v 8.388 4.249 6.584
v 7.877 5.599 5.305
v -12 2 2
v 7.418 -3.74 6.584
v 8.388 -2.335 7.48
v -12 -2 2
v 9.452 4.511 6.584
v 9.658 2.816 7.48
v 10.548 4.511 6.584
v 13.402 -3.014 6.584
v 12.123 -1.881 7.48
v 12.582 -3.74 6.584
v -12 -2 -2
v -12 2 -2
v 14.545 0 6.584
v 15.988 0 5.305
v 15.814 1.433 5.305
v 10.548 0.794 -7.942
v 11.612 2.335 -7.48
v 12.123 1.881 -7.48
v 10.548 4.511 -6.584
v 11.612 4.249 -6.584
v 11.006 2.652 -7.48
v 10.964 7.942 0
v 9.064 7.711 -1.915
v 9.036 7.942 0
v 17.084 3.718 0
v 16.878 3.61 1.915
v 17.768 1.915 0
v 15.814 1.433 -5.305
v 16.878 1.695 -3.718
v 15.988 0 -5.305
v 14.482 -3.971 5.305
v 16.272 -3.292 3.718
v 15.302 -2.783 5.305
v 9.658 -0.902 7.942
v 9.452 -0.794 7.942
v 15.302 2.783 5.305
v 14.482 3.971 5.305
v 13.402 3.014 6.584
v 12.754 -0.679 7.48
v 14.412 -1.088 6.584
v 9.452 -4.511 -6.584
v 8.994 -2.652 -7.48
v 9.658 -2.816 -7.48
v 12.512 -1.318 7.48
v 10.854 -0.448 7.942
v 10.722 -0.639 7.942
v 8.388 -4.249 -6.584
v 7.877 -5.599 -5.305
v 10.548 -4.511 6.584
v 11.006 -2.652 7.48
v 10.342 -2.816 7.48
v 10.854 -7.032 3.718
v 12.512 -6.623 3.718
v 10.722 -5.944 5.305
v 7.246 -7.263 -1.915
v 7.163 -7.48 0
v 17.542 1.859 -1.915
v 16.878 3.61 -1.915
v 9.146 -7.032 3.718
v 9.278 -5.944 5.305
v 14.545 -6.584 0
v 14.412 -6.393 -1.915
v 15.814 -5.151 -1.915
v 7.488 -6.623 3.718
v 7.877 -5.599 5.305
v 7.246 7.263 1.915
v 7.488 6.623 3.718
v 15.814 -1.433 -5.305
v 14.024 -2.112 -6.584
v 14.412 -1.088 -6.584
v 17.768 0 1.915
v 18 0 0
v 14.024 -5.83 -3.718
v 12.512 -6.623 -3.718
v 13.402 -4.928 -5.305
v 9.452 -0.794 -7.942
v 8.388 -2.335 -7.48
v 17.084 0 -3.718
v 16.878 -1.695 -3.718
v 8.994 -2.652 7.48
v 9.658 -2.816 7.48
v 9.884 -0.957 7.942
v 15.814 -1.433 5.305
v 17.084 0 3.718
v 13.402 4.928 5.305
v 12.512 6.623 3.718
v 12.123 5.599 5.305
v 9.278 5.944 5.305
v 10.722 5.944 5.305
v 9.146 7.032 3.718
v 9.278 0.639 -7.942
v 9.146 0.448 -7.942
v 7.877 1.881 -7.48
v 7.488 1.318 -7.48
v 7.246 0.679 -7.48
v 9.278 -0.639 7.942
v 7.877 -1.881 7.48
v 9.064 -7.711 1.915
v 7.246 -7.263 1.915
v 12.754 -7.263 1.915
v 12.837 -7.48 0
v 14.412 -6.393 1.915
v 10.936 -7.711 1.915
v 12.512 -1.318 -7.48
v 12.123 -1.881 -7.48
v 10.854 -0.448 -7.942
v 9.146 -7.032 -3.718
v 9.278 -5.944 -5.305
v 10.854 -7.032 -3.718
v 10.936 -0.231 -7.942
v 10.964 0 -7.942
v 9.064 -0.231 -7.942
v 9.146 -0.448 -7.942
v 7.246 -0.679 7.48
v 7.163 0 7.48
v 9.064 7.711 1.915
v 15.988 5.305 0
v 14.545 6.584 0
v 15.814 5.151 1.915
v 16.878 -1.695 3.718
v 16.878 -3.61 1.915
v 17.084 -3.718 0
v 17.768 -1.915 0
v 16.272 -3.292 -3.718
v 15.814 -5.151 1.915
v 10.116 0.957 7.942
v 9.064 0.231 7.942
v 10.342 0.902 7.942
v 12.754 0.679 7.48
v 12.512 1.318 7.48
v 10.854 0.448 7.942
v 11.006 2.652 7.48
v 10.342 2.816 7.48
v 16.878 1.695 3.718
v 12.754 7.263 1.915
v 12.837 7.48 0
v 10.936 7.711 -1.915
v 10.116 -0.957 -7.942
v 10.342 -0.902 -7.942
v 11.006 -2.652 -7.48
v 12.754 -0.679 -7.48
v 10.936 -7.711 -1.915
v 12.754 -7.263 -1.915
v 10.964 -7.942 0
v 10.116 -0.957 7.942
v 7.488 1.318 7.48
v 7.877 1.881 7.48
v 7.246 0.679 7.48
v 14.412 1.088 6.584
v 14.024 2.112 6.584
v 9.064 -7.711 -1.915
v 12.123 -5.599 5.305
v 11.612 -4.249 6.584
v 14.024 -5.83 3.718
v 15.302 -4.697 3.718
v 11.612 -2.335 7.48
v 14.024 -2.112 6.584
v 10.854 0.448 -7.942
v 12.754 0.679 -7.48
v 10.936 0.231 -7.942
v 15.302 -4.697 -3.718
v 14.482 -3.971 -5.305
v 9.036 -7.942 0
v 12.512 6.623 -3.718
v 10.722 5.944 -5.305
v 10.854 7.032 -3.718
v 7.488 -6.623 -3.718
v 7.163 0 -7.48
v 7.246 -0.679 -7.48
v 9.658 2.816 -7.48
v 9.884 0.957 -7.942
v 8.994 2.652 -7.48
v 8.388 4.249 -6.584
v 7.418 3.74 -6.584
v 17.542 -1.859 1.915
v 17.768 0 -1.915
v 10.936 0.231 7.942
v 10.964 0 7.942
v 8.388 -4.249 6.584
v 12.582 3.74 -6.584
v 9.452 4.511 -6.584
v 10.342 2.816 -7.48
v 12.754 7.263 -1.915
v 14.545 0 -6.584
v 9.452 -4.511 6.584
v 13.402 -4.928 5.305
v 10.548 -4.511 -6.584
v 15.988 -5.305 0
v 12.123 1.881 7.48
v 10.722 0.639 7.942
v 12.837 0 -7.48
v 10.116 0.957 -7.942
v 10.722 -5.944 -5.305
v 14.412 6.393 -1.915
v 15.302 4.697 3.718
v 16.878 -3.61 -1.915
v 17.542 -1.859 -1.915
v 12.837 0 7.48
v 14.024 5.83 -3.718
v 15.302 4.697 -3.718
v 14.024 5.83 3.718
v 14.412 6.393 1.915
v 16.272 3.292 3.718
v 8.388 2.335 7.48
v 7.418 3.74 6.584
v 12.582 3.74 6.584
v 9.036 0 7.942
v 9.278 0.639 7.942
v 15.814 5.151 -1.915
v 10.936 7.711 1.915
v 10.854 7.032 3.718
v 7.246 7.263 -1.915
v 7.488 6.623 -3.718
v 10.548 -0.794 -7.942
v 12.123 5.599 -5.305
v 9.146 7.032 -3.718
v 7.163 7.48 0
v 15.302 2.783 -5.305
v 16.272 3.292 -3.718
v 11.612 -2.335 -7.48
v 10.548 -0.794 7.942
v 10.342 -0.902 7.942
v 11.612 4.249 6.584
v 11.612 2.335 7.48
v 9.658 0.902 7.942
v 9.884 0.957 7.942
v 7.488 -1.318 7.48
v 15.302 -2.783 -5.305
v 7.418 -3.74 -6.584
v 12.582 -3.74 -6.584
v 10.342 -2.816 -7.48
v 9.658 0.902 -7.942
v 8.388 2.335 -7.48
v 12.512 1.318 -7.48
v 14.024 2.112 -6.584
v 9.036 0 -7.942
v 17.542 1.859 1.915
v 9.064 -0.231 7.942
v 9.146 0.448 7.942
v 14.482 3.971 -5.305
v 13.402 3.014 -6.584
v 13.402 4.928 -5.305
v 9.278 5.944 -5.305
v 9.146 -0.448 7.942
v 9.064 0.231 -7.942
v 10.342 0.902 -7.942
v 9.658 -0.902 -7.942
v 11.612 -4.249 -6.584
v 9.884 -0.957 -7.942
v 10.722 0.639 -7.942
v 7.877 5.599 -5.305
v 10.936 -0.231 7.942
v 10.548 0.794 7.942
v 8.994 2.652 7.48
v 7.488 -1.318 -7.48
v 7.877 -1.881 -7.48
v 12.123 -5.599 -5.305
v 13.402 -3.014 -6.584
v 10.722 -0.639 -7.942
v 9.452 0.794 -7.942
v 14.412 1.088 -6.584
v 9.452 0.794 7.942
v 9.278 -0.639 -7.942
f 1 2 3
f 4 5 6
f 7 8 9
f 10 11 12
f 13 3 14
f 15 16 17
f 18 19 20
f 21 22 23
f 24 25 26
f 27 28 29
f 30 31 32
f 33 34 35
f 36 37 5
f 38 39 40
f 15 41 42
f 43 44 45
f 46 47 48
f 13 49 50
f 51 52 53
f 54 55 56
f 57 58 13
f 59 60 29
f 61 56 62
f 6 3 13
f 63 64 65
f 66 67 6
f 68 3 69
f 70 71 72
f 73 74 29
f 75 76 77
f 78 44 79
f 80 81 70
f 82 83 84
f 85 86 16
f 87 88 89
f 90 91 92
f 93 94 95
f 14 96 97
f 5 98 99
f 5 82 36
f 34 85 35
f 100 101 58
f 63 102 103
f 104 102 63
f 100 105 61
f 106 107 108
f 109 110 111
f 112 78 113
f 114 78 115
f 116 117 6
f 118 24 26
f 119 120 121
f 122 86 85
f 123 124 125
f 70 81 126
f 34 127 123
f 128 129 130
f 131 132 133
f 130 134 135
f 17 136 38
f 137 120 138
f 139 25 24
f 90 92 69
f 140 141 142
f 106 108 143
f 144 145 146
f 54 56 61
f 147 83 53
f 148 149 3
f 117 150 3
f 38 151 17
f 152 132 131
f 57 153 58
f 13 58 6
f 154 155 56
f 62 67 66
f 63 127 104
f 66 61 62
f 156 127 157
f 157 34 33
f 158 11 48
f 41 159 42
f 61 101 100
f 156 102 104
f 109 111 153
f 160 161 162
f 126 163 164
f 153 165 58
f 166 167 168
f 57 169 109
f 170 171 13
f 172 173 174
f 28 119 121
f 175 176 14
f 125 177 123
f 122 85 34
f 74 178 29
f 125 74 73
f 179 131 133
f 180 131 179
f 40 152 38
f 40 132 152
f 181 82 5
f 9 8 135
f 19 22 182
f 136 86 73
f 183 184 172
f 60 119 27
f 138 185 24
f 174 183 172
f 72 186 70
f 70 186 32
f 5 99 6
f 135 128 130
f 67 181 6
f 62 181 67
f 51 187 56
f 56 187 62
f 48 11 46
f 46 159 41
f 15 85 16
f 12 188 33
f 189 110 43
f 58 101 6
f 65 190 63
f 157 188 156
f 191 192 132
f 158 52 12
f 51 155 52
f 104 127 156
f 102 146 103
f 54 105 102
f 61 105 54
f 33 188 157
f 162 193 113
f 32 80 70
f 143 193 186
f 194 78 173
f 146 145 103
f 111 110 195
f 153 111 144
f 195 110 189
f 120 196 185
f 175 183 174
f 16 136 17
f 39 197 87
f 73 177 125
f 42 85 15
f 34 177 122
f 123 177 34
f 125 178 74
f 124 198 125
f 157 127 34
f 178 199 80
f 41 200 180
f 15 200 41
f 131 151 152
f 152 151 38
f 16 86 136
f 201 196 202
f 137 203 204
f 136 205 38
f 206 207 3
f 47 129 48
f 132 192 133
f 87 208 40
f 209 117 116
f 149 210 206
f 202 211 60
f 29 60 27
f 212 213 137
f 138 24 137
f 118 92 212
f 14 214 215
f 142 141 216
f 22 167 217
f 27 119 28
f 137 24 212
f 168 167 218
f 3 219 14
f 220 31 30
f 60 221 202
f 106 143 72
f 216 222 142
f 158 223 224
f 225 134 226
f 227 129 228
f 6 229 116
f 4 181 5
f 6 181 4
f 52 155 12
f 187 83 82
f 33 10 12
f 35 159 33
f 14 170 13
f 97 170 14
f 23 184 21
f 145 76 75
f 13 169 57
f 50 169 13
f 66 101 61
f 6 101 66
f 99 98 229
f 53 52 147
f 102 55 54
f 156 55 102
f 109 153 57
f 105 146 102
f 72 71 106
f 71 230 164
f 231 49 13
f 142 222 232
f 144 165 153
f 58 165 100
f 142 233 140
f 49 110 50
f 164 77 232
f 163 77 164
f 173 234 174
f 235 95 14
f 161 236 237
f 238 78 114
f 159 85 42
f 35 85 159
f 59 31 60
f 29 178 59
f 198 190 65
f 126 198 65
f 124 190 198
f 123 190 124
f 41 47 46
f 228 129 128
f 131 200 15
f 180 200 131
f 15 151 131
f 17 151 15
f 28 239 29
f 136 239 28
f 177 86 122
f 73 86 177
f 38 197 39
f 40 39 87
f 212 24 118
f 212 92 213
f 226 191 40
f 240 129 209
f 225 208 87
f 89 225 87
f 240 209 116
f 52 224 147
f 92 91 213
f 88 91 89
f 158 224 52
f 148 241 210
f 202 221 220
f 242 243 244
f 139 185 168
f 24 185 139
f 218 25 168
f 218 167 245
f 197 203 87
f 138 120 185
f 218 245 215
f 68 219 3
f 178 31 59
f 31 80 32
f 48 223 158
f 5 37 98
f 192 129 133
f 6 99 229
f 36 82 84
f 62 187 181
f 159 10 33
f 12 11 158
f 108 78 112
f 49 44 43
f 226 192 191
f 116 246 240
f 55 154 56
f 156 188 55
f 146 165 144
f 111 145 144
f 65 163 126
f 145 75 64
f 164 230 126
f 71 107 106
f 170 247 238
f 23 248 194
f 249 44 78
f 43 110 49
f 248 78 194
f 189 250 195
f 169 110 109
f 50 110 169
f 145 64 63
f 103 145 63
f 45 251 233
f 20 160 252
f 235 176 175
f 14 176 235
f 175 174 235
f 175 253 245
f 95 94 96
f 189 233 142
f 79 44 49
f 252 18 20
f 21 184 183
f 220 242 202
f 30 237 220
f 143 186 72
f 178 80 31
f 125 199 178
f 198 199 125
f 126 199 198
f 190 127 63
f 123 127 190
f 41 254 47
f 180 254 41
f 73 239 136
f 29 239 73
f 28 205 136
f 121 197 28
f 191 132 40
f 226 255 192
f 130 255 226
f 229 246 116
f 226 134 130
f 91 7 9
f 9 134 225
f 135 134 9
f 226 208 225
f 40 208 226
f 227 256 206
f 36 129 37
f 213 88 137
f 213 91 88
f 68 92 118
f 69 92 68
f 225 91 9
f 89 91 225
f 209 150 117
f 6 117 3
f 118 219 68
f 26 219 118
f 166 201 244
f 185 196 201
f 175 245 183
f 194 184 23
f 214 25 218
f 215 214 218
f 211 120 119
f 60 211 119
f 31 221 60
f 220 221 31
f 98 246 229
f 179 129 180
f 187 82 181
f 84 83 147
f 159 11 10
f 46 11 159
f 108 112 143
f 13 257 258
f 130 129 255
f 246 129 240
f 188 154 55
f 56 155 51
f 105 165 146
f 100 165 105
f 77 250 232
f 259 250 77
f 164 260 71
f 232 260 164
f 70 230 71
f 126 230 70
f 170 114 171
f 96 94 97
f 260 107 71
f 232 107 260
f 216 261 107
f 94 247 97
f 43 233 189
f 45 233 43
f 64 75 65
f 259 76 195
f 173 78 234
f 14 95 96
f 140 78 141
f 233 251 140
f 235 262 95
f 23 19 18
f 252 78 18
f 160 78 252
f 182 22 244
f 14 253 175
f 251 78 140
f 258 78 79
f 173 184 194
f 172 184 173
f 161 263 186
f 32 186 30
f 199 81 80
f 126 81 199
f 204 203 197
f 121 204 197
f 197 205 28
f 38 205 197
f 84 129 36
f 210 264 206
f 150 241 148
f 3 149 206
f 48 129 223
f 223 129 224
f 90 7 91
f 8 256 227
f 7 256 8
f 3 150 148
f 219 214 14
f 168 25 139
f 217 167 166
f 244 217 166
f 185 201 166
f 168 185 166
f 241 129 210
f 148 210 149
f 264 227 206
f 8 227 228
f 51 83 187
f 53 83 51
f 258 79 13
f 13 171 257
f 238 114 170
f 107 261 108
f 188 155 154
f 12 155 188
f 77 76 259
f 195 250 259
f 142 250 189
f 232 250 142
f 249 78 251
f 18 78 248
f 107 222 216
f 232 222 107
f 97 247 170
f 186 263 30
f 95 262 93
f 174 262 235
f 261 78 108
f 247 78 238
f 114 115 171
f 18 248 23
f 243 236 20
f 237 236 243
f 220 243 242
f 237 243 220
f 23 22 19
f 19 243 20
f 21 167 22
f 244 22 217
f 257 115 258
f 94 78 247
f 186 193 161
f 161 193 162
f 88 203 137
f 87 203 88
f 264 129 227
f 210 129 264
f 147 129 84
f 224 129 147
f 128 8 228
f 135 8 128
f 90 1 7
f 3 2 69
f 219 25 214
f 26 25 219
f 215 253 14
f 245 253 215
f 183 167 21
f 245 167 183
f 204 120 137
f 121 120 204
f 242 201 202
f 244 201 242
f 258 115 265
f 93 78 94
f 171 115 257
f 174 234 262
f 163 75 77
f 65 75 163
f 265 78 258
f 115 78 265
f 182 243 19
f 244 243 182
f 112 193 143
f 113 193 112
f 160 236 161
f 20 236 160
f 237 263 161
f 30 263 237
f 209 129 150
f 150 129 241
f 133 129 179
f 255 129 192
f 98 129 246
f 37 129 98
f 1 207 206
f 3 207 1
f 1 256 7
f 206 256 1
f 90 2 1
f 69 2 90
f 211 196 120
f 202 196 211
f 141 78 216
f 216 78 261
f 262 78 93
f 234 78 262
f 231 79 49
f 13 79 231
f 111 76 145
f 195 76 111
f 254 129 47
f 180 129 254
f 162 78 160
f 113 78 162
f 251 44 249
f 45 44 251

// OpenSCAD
hull() {
	translate([10, 0, 0]) sphere(8);
	translate([-10, 0, 0]) cube([4, 4, 4], center=true);
}
